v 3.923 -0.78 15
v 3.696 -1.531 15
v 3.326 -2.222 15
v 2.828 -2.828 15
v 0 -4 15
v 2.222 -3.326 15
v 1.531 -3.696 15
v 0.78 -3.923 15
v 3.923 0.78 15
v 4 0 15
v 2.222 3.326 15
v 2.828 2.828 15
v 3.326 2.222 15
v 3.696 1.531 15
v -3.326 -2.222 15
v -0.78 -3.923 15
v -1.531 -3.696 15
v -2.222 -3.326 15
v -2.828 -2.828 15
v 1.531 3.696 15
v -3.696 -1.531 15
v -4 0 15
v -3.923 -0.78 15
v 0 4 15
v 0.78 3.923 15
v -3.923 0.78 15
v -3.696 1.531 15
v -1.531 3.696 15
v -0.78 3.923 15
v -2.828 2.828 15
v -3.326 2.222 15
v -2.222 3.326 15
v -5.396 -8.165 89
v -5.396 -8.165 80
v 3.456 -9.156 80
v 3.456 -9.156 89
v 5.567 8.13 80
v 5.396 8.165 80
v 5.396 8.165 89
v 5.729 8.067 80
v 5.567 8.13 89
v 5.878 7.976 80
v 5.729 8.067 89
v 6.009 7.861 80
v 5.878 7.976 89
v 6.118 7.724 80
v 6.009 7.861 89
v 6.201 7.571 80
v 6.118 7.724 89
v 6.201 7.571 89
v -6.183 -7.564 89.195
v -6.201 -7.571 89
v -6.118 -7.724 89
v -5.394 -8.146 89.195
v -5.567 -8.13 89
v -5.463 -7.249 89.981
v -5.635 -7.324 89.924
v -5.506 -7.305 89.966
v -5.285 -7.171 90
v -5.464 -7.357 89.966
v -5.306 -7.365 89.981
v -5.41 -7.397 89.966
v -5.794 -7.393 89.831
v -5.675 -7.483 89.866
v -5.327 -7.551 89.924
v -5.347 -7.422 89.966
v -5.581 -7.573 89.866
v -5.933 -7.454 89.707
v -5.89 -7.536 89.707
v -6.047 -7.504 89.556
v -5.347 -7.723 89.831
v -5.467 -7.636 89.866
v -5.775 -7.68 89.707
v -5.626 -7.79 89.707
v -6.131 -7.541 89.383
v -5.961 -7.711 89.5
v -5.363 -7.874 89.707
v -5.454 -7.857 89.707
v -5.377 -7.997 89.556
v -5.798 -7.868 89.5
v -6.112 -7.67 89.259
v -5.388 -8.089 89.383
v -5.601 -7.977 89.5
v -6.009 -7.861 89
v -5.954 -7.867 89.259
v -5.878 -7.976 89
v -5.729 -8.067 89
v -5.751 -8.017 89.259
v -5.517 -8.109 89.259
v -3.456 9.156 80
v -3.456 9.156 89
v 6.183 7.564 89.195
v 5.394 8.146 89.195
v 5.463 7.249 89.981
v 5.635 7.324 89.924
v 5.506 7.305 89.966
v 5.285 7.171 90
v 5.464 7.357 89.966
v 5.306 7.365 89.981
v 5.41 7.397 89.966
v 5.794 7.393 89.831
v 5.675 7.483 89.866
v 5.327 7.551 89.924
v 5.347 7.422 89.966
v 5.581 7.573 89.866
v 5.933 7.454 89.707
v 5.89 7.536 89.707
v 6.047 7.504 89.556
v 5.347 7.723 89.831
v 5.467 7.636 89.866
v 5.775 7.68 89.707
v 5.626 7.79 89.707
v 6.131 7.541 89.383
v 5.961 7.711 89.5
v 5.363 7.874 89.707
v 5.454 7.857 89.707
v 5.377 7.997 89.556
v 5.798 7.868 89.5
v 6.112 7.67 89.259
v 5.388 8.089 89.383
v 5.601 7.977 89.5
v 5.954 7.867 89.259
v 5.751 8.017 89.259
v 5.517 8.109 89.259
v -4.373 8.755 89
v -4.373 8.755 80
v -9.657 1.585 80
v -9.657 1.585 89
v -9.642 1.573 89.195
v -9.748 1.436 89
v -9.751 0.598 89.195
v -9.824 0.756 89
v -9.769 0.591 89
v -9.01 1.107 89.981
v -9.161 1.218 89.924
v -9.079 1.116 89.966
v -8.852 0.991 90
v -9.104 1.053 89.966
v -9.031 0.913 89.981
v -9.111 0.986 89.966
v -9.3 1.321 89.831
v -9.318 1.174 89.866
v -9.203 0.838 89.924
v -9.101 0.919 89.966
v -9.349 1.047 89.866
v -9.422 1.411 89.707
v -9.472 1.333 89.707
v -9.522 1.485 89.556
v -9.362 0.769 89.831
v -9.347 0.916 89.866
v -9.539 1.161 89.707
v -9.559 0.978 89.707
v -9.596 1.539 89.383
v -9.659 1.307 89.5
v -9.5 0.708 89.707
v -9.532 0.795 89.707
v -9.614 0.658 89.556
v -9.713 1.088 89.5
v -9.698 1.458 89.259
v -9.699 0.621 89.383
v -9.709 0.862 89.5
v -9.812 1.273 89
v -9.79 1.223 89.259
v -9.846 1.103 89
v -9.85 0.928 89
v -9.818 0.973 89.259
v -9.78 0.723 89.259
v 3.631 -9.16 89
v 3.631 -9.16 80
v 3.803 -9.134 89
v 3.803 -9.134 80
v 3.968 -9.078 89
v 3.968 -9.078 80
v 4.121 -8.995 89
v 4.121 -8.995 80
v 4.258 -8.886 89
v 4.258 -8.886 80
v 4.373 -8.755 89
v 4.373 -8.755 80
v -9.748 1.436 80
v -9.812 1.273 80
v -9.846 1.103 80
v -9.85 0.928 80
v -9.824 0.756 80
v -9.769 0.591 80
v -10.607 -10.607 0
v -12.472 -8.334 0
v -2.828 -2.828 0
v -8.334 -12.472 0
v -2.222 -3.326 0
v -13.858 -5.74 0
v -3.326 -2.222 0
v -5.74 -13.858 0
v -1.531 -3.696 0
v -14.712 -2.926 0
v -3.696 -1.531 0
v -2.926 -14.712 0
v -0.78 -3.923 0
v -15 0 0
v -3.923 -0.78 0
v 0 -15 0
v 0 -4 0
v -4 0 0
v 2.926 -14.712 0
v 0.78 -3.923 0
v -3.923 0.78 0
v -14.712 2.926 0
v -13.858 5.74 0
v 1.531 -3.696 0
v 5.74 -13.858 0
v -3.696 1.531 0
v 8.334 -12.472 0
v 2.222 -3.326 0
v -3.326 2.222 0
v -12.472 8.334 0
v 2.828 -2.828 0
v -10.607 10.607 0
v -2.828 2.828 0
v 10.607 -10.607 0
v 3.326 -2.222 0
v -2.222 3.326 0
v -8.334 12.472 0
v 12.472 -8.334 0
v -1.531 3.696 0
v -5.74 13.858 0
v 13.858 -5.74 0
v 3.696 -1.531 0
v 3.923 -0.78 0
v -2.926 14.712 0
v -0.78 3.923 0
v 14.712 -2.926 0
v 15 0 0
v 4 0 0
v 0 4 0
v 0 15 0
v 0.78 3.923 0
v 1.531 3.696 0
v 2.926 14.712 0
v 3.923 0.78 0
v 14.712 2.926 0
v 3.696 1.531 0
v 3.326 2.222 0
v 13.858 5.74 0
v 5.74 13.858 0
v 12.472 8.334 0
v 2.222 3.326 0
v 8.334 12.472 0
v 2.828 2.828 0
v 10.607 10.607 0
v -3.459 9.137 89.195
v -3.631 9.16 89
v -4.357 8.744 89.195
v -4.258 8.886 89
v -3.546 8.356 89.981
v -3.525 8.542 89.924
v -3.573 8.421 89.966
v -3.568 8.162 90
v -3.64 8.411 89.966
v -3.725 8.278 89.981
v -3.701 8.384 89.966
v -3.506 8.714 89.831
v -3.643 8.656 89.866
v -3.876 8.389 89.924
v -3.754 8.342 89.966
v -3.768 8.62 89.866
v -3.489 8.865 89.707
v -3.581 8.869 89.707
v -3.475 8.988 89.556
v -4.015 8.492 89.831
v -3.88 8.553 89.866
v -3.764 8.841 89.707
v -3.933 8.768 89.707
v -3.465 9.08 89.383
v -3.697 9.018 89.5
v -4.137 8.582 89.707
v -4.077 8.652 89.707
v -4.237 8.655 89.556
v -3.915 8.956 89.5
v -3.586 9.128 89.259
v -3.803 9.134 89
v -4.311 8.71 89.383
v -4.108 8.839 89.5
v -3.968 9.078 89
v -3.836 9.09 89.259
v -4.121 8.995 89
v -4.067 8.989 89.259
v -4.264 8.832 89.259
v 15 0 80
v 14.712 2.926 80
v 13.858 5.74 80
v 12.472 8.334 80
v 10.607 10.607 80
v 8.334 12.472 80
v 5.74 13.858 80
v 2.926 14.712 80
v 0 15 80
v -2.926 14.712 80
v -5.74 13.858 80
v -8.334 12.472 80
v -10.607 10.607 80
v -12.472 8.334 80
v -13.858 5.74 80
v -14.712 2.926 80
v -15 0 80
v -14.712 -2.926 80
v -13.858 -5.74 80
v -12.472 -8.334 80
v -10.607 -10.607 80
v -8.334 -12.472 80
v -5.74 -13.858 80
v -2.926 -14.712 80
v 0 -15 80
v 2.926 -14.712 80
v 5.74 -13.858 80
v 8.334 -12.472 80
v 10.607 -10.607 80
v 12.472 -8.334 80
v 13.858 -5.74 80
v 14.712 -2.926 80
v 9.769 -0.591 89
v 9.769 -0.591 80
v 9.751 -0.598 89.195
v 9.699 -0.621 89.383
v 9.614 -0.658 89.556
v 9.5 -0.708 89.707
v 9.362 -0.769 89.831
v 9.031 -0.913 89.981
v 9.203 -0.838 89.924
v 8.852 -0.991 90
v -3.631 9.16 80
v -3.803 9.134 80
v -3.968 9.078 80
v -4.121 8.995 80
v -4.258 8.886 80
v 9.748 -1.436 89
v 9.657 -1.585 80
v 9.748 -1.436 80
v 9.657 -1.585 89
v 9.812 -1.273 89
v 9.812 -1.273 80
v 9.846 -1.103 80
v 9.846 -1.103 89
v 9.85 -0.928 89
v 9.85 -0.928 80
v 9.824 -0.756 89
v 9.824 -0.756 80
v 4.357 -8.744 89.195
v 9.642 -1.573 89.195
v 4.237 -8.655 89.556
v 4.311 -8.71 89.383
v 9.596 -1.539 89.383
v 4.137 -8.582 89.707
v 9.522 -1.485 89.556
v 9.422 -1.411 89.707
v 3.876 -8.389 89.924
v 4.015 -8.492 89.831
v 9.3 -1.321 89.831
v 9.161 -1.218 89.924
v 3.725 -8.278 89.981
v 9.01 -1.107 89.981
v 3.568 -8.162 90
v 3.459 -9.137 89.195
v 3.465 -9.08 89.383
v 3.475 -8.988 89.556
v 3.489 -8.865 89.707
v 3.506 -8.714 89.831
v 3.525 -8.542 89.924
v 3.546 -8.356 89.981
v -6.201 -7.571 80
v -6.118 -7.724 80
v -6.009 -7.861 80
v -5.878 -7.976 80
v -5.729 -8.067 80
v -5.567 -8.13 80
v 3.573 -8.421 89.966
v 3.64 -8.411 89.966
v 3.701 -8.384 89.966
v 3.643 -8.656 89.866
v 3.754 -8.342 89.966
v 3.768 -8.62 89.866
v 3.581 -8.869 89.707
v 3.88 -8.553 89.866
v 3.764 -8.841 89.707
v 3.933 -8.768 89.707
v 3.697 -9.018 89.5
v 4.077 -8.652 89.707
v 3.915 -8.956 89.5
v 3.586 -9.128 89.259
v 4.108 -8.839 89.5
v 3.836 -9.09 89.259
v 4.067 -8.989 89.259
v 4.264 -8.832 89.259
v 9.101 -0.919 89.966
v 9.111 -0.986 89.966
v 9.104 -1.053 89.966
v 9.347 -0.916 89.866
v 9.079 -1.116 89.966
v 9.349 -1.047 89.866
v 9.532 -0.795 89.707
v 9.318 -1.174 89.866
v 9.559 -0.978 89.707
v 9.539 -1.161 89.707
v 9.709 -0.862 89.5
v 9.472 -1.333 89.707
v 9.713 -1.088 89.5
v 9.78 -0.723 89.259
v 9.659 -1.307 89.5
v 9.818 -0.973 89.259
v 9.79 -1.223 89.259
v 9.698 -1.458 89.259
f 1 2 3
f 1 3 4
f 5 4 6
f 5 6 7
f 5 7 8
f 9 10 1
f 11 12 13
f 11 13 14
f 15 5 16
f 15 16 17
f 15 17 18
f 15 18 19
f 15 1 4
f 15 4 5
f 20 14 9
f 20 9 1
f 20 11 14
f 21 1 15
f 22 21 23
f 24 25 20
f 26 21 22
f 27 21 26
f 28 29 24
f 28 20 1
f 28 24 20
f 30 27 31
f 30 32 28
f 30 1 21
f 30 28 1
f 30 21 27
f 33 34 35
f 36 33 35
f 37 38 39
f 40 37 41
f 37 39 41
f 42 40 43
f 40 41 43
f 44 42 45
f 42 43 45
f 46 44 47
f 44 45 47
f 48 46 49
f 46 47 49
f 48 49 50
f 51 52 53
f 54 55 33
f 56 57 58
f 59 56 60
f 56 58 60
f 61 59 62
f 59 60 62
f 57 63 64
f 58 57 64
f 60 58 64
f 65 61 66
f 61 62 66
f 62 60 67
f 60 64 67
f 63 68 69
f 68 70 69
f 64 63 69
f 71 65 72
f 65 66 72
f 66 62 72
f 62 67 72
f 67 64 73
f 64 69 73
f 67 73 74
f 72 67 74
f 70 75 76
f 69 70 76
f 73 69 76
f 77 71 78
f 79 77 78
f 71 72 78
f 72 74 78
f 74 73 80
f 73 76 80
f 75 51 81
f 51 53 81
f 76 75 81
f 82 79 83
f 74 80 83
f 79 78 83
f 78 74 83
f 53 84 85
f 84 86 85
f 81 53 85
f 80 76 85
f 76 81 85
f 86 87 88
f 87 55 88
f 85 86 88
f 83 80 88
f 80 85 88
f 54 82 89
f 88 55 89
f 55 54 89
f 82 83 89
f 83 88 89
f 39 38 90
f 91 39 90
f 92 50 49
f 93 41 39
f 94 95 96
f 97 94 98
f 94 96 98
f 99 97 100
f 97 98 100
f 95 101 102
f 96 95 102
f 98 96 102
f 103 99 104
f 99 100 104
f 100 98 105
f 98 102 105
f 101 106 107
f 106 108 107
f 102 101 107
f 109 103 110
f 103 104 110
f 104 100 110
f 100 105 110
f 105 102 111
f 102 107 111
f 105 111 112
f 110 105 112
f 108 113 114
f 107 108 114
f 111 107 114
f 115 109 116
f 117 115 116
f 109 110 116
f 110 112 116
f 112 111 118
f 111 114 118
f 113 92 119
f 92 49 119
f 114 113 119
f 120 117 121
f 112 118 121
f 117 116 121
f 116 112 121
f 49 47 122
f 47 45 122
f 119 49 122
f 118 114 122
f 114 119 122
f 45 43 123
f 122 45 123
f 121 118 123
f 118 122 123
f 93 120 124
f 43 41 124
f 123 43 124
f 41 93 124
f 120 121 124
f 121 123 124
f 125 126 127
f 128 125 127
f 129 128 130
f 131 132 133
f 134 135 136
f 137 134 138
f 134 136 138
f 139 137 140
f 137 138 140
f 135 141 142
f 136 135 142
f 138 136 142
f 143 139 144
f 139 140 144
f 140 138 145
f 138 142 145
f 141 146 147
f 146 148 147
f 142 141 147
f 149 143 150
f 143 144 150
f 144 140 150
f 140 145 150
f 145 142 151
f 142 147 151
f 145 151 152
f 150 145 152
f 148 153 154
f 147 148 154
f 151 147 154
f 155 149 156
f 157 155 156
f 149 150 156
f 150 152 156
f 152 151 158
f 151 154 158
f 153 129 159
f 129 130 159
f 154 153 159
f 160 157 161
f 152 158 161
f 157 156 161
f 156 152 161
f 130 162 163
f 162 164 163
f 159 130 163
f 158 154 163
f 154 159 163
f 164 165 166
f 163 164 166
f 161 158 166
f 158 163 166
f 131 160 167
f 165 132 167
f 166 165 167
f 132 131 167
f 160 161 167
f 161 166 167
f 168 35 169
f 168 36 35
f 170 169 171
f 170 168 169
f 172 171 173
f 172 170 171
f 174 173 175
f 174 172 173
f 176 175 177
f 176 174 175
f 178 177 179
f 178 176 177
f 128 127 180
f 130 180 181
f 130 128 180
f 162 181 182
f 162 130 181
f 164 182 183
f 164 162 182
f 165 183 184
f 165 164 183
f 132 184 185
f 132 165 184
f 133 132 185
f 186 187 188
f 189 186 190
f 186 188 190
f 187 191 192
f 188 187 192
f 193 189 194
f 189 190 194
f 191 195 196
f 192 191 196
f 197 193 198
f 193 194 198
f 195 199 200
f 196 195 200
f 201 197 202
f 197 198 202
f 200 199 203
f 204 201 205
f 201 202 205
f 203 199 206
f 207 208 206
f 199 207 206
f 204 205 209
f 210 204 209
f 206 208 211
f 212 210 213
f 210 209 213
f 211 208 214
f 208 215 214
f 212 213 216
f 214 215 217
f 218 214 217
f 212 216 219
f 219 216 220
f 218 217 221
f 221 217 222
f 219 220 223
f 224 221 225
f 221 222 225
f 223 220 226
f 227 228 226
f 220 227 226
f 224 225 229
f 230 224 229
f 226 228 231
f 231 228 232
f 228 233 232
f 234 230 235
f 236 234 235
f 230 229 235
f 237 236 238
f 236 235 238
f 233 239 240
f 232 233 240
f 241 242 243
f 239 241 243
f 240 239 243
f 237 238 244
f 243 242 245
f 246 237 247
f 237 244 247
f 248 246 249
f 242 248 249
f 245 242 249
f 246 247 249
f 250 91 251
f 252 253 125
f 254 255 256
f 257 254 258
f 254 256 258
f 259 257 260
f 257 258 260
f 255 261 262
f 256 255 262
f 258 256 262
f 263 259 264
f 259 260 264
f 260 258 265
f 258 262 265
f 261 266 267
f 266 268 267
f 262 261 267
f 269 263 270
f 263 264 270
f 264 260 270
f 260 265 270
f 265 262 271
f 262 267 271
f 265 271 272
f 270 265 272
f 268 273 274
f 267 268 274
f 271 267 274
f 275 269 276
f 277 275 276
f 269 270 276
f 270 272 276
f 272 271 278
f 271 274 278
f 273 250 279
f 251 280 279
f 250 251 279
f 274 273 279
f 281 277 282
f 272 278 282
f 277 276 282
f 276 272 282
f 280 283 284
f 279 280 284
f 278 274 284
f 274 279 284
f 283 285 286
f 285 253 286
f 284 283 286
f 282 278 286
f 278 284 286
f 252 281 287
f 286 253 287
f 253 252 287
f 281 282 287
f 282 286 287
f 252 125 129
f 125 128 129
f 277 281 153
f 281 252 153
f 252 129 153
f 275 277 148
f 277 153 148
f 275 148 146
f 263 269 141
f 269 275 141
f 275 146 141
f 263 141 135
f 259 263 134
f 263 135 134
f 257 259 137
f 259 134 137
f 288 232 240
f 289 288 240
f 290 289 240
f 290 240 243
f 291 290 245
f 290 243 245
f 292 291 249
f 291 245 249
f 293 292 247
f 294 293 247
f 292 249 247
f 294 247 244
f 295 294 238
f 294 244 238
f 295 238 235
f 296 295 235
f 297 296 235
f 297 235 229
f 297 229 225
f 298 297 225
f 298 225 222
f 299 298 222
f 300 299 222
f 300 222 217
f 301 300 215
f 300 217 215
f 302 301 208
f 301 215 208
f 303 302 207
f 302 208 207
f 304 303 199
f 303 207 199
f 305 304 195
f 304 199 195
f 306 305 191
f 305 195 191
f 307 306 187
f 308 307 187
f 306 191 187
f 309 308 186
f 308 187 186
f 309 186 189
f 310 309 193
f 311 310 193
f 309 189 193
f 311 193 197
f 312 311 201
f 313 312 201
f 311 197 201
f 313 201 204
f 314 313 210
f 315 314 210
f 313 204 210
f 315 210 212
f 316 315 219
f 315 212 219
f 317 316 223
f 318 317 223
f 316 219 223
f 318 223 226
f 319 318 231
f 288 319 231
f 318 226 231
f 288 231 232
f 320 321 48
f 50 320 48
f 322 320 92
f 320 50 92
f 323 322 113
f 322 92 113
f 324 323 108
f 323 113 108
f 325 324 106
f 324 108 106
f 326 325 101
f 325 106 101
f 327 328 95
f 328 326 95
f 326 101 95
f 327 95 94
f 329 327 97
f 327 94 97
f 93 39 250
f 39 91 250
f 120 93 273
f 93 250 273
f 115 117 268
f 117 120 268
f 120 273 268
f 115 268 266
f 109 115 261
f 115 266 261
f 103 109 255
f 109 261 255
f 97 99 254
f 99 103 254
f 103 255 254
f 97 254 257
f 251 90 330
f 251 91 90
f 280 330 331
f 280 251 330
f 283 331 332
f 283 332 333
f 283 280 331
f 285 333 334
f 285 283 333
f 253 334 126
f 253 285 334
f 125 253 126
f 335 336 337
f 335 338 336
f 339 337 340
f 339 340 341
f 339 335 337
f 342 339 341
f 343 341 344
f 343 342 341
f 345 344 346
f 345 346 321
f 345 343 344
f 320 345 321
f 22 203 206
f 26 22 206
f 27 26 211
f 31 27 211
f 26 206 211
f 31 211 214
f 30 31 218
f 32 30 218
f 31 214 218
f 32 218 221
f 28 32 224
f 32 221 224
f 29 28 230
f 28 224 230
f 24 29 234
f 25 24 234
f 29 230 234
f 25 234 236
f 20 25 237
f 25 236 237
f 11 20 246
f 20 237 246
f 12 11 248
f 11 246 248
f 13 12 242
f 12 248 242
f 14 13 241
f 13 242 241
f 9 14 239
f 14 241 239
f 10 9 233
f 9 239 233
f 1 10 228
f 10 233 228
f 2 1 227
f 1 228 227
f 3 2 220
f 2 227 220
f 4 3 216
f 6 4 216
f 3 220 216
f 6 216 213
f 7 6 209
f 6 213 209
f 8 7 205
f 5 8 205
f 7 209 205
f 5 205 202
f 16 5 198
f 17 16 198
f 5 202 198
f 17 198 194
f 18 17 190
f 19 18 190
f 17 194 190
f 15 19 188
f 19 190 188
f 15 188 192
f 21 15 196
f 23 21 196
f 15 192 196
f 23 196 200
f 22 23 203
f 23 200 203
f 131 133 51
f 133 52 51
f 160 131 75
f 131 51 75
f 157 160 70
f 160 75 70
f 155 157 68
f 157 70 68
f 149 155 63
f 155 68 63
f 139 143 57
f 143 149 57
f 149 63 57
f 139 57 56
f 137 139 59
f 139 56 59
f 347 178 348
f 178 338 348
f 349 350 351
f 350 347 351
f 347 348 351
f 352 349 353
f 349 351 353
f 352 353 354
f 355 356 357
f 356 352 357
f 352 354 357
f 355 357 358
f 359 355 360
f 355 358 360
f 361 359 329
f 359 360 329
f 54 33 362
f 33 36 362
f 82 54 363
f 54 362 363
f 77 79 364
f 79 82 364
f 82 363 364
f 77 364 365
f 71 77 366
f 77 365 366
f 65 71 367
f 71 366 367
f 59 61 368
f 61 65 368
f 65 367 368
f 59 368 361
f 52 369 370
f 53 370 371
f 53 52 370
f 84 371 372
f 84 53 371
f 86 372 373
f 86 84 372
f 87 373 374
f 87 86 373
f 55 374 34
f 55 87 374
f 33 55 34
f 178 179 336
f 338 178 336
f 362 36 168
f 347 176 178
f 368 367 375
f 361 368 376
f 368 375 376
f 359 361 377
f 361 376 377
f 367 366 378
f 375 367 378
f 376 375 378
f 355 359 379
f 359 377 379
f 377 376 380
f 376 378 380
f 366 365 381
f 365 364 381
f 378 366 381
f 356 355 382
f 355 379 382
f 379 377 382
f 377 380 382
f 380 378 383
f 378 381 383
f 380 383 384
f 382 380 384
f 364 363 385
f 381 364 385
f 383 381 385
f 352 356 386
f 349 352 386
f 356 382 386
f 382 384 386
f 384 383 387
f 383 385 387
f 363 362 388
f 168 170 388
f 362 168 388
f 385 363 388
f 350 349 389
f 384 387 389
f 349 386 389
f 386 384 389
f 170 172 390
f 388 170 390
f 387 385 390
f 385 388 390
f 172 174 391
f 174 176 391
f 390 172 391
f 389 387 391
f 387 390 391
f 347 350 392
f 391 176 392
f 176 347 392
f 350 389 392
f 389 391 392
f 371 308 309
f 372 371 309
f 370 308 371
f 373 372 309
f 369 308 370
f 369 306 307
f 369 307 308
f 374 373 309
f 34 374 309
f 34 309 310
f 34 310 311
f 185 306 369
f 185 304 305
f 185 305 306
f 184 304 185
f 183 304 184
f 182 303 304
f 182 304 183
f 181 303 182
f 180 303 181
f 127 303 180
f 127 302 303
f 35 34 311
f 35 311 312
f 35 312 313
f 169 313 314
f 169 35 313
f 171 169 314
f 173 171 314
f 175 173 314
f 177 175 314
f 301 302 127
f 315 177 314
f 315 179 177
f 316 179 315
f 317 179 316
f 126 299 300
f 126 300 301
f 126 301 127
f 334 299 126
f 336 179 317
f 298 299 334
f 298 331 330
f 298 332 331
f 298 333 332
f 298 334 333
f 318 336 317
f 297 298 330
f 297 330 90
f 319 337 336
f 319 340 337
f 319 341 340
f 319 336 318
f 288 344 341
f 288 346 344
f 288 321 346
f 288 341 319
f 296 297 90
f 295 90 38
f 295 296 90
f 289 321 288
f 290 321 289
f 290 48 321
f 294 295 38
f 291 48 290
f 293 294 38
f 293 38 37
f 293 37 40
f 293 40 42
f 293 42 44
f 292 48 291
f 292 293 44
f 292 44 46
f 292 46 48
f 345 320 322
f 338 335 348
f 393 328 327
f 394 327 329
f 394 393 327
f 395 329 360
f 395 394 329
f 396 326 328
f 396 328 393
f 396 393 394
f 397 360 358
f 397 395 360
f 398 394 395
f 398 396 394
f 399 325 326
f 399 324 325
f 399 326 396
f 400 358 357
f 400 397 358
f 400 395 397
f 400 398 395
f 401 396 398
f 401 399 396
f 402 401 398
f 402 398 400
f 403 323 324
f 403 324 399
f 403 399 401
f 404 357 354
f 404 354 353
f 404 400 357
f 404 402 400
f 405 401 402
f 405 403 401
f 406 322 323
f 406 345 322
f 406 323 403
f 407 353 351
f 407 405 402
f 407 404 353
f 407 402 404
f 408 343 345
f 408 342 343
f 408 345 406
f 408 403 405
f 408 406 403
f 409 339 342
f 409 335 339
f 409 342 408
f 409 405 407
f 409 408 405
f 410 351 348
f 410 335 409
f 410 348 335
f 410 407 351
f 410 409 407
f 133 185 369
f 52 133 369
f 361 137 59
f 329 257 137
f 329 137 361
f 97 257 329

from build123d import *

# Parameters (mm, degrees)
SKETCH1_R           = 15
BOSS_EXTRUDE1_DEPTH = 80
SKETCH2_R           = 4
CUT_EXTRUDE1_DEPTH  = 15
BOSS_EXTRUDE2_DEPTH = 10
FILLET1_R           = 1


with BuildPart() as part:
    # Sketch1 → Boss-Extrude1 (new body)
    with BuildSketch(Plane.XY):
        Circle(SKETCH1_R)
    extrude(amount=BOSS_EXTRUDE1_DEPTH)

    # Sketch2 → Cut-Extrude1 (cut)
    with BuildSketch(Plane(origin=(0, 0, 0), x_dir=(-1, 0, 0), z_dir=(0, 0, -1))):
        Circle(SKETCH2_R)
    extrude(amount=-CUT_EXTRUDE1_DEPTH, mode=Mode.SUBTRACT)

    # Sketch4 → Boss-Extrude2 (add)
    with BuildSketch(Plane.XY.offset(80)):
        Polygon((5.969749807, 8.100368726), (-4.030250193, 9.22013935), (-10, 1.119770624), (-5.969749807, -8.100368726), (4.030250193, -9.22013935), (10, -1.119770624), align=None)
    extrude(amount=BOSS_EXTRUDE2_DEPTH)

    # Fillet1
    fillet1_edges = [part.edges().sort_by_distance(p)[0] for p in [
        (10, -1.119770624, 85),
        (5.969749807, 8.100368726, 85),
        (-4.030250193, 9.22013935, 85),
        (-10, 1.119770624, 85),
        (-5.969749807, -8.100368726, 85),
        (4.030250193, -9.22013935, 85),
        (7.984874903, 3.490299051, 90),
        (0.969749807, 8.660254038, 90),
        (-7.015125097, 5.169954987, 90),
        (-7.984874903, -3.490299051, 90),
        (-0.969749807, -8.660254038, 90),
        (7.015125097, -5.169954987, 90),
    ]]
    fillet(fillet1_edges, radius=FILLET1_R)


solid = part.part
